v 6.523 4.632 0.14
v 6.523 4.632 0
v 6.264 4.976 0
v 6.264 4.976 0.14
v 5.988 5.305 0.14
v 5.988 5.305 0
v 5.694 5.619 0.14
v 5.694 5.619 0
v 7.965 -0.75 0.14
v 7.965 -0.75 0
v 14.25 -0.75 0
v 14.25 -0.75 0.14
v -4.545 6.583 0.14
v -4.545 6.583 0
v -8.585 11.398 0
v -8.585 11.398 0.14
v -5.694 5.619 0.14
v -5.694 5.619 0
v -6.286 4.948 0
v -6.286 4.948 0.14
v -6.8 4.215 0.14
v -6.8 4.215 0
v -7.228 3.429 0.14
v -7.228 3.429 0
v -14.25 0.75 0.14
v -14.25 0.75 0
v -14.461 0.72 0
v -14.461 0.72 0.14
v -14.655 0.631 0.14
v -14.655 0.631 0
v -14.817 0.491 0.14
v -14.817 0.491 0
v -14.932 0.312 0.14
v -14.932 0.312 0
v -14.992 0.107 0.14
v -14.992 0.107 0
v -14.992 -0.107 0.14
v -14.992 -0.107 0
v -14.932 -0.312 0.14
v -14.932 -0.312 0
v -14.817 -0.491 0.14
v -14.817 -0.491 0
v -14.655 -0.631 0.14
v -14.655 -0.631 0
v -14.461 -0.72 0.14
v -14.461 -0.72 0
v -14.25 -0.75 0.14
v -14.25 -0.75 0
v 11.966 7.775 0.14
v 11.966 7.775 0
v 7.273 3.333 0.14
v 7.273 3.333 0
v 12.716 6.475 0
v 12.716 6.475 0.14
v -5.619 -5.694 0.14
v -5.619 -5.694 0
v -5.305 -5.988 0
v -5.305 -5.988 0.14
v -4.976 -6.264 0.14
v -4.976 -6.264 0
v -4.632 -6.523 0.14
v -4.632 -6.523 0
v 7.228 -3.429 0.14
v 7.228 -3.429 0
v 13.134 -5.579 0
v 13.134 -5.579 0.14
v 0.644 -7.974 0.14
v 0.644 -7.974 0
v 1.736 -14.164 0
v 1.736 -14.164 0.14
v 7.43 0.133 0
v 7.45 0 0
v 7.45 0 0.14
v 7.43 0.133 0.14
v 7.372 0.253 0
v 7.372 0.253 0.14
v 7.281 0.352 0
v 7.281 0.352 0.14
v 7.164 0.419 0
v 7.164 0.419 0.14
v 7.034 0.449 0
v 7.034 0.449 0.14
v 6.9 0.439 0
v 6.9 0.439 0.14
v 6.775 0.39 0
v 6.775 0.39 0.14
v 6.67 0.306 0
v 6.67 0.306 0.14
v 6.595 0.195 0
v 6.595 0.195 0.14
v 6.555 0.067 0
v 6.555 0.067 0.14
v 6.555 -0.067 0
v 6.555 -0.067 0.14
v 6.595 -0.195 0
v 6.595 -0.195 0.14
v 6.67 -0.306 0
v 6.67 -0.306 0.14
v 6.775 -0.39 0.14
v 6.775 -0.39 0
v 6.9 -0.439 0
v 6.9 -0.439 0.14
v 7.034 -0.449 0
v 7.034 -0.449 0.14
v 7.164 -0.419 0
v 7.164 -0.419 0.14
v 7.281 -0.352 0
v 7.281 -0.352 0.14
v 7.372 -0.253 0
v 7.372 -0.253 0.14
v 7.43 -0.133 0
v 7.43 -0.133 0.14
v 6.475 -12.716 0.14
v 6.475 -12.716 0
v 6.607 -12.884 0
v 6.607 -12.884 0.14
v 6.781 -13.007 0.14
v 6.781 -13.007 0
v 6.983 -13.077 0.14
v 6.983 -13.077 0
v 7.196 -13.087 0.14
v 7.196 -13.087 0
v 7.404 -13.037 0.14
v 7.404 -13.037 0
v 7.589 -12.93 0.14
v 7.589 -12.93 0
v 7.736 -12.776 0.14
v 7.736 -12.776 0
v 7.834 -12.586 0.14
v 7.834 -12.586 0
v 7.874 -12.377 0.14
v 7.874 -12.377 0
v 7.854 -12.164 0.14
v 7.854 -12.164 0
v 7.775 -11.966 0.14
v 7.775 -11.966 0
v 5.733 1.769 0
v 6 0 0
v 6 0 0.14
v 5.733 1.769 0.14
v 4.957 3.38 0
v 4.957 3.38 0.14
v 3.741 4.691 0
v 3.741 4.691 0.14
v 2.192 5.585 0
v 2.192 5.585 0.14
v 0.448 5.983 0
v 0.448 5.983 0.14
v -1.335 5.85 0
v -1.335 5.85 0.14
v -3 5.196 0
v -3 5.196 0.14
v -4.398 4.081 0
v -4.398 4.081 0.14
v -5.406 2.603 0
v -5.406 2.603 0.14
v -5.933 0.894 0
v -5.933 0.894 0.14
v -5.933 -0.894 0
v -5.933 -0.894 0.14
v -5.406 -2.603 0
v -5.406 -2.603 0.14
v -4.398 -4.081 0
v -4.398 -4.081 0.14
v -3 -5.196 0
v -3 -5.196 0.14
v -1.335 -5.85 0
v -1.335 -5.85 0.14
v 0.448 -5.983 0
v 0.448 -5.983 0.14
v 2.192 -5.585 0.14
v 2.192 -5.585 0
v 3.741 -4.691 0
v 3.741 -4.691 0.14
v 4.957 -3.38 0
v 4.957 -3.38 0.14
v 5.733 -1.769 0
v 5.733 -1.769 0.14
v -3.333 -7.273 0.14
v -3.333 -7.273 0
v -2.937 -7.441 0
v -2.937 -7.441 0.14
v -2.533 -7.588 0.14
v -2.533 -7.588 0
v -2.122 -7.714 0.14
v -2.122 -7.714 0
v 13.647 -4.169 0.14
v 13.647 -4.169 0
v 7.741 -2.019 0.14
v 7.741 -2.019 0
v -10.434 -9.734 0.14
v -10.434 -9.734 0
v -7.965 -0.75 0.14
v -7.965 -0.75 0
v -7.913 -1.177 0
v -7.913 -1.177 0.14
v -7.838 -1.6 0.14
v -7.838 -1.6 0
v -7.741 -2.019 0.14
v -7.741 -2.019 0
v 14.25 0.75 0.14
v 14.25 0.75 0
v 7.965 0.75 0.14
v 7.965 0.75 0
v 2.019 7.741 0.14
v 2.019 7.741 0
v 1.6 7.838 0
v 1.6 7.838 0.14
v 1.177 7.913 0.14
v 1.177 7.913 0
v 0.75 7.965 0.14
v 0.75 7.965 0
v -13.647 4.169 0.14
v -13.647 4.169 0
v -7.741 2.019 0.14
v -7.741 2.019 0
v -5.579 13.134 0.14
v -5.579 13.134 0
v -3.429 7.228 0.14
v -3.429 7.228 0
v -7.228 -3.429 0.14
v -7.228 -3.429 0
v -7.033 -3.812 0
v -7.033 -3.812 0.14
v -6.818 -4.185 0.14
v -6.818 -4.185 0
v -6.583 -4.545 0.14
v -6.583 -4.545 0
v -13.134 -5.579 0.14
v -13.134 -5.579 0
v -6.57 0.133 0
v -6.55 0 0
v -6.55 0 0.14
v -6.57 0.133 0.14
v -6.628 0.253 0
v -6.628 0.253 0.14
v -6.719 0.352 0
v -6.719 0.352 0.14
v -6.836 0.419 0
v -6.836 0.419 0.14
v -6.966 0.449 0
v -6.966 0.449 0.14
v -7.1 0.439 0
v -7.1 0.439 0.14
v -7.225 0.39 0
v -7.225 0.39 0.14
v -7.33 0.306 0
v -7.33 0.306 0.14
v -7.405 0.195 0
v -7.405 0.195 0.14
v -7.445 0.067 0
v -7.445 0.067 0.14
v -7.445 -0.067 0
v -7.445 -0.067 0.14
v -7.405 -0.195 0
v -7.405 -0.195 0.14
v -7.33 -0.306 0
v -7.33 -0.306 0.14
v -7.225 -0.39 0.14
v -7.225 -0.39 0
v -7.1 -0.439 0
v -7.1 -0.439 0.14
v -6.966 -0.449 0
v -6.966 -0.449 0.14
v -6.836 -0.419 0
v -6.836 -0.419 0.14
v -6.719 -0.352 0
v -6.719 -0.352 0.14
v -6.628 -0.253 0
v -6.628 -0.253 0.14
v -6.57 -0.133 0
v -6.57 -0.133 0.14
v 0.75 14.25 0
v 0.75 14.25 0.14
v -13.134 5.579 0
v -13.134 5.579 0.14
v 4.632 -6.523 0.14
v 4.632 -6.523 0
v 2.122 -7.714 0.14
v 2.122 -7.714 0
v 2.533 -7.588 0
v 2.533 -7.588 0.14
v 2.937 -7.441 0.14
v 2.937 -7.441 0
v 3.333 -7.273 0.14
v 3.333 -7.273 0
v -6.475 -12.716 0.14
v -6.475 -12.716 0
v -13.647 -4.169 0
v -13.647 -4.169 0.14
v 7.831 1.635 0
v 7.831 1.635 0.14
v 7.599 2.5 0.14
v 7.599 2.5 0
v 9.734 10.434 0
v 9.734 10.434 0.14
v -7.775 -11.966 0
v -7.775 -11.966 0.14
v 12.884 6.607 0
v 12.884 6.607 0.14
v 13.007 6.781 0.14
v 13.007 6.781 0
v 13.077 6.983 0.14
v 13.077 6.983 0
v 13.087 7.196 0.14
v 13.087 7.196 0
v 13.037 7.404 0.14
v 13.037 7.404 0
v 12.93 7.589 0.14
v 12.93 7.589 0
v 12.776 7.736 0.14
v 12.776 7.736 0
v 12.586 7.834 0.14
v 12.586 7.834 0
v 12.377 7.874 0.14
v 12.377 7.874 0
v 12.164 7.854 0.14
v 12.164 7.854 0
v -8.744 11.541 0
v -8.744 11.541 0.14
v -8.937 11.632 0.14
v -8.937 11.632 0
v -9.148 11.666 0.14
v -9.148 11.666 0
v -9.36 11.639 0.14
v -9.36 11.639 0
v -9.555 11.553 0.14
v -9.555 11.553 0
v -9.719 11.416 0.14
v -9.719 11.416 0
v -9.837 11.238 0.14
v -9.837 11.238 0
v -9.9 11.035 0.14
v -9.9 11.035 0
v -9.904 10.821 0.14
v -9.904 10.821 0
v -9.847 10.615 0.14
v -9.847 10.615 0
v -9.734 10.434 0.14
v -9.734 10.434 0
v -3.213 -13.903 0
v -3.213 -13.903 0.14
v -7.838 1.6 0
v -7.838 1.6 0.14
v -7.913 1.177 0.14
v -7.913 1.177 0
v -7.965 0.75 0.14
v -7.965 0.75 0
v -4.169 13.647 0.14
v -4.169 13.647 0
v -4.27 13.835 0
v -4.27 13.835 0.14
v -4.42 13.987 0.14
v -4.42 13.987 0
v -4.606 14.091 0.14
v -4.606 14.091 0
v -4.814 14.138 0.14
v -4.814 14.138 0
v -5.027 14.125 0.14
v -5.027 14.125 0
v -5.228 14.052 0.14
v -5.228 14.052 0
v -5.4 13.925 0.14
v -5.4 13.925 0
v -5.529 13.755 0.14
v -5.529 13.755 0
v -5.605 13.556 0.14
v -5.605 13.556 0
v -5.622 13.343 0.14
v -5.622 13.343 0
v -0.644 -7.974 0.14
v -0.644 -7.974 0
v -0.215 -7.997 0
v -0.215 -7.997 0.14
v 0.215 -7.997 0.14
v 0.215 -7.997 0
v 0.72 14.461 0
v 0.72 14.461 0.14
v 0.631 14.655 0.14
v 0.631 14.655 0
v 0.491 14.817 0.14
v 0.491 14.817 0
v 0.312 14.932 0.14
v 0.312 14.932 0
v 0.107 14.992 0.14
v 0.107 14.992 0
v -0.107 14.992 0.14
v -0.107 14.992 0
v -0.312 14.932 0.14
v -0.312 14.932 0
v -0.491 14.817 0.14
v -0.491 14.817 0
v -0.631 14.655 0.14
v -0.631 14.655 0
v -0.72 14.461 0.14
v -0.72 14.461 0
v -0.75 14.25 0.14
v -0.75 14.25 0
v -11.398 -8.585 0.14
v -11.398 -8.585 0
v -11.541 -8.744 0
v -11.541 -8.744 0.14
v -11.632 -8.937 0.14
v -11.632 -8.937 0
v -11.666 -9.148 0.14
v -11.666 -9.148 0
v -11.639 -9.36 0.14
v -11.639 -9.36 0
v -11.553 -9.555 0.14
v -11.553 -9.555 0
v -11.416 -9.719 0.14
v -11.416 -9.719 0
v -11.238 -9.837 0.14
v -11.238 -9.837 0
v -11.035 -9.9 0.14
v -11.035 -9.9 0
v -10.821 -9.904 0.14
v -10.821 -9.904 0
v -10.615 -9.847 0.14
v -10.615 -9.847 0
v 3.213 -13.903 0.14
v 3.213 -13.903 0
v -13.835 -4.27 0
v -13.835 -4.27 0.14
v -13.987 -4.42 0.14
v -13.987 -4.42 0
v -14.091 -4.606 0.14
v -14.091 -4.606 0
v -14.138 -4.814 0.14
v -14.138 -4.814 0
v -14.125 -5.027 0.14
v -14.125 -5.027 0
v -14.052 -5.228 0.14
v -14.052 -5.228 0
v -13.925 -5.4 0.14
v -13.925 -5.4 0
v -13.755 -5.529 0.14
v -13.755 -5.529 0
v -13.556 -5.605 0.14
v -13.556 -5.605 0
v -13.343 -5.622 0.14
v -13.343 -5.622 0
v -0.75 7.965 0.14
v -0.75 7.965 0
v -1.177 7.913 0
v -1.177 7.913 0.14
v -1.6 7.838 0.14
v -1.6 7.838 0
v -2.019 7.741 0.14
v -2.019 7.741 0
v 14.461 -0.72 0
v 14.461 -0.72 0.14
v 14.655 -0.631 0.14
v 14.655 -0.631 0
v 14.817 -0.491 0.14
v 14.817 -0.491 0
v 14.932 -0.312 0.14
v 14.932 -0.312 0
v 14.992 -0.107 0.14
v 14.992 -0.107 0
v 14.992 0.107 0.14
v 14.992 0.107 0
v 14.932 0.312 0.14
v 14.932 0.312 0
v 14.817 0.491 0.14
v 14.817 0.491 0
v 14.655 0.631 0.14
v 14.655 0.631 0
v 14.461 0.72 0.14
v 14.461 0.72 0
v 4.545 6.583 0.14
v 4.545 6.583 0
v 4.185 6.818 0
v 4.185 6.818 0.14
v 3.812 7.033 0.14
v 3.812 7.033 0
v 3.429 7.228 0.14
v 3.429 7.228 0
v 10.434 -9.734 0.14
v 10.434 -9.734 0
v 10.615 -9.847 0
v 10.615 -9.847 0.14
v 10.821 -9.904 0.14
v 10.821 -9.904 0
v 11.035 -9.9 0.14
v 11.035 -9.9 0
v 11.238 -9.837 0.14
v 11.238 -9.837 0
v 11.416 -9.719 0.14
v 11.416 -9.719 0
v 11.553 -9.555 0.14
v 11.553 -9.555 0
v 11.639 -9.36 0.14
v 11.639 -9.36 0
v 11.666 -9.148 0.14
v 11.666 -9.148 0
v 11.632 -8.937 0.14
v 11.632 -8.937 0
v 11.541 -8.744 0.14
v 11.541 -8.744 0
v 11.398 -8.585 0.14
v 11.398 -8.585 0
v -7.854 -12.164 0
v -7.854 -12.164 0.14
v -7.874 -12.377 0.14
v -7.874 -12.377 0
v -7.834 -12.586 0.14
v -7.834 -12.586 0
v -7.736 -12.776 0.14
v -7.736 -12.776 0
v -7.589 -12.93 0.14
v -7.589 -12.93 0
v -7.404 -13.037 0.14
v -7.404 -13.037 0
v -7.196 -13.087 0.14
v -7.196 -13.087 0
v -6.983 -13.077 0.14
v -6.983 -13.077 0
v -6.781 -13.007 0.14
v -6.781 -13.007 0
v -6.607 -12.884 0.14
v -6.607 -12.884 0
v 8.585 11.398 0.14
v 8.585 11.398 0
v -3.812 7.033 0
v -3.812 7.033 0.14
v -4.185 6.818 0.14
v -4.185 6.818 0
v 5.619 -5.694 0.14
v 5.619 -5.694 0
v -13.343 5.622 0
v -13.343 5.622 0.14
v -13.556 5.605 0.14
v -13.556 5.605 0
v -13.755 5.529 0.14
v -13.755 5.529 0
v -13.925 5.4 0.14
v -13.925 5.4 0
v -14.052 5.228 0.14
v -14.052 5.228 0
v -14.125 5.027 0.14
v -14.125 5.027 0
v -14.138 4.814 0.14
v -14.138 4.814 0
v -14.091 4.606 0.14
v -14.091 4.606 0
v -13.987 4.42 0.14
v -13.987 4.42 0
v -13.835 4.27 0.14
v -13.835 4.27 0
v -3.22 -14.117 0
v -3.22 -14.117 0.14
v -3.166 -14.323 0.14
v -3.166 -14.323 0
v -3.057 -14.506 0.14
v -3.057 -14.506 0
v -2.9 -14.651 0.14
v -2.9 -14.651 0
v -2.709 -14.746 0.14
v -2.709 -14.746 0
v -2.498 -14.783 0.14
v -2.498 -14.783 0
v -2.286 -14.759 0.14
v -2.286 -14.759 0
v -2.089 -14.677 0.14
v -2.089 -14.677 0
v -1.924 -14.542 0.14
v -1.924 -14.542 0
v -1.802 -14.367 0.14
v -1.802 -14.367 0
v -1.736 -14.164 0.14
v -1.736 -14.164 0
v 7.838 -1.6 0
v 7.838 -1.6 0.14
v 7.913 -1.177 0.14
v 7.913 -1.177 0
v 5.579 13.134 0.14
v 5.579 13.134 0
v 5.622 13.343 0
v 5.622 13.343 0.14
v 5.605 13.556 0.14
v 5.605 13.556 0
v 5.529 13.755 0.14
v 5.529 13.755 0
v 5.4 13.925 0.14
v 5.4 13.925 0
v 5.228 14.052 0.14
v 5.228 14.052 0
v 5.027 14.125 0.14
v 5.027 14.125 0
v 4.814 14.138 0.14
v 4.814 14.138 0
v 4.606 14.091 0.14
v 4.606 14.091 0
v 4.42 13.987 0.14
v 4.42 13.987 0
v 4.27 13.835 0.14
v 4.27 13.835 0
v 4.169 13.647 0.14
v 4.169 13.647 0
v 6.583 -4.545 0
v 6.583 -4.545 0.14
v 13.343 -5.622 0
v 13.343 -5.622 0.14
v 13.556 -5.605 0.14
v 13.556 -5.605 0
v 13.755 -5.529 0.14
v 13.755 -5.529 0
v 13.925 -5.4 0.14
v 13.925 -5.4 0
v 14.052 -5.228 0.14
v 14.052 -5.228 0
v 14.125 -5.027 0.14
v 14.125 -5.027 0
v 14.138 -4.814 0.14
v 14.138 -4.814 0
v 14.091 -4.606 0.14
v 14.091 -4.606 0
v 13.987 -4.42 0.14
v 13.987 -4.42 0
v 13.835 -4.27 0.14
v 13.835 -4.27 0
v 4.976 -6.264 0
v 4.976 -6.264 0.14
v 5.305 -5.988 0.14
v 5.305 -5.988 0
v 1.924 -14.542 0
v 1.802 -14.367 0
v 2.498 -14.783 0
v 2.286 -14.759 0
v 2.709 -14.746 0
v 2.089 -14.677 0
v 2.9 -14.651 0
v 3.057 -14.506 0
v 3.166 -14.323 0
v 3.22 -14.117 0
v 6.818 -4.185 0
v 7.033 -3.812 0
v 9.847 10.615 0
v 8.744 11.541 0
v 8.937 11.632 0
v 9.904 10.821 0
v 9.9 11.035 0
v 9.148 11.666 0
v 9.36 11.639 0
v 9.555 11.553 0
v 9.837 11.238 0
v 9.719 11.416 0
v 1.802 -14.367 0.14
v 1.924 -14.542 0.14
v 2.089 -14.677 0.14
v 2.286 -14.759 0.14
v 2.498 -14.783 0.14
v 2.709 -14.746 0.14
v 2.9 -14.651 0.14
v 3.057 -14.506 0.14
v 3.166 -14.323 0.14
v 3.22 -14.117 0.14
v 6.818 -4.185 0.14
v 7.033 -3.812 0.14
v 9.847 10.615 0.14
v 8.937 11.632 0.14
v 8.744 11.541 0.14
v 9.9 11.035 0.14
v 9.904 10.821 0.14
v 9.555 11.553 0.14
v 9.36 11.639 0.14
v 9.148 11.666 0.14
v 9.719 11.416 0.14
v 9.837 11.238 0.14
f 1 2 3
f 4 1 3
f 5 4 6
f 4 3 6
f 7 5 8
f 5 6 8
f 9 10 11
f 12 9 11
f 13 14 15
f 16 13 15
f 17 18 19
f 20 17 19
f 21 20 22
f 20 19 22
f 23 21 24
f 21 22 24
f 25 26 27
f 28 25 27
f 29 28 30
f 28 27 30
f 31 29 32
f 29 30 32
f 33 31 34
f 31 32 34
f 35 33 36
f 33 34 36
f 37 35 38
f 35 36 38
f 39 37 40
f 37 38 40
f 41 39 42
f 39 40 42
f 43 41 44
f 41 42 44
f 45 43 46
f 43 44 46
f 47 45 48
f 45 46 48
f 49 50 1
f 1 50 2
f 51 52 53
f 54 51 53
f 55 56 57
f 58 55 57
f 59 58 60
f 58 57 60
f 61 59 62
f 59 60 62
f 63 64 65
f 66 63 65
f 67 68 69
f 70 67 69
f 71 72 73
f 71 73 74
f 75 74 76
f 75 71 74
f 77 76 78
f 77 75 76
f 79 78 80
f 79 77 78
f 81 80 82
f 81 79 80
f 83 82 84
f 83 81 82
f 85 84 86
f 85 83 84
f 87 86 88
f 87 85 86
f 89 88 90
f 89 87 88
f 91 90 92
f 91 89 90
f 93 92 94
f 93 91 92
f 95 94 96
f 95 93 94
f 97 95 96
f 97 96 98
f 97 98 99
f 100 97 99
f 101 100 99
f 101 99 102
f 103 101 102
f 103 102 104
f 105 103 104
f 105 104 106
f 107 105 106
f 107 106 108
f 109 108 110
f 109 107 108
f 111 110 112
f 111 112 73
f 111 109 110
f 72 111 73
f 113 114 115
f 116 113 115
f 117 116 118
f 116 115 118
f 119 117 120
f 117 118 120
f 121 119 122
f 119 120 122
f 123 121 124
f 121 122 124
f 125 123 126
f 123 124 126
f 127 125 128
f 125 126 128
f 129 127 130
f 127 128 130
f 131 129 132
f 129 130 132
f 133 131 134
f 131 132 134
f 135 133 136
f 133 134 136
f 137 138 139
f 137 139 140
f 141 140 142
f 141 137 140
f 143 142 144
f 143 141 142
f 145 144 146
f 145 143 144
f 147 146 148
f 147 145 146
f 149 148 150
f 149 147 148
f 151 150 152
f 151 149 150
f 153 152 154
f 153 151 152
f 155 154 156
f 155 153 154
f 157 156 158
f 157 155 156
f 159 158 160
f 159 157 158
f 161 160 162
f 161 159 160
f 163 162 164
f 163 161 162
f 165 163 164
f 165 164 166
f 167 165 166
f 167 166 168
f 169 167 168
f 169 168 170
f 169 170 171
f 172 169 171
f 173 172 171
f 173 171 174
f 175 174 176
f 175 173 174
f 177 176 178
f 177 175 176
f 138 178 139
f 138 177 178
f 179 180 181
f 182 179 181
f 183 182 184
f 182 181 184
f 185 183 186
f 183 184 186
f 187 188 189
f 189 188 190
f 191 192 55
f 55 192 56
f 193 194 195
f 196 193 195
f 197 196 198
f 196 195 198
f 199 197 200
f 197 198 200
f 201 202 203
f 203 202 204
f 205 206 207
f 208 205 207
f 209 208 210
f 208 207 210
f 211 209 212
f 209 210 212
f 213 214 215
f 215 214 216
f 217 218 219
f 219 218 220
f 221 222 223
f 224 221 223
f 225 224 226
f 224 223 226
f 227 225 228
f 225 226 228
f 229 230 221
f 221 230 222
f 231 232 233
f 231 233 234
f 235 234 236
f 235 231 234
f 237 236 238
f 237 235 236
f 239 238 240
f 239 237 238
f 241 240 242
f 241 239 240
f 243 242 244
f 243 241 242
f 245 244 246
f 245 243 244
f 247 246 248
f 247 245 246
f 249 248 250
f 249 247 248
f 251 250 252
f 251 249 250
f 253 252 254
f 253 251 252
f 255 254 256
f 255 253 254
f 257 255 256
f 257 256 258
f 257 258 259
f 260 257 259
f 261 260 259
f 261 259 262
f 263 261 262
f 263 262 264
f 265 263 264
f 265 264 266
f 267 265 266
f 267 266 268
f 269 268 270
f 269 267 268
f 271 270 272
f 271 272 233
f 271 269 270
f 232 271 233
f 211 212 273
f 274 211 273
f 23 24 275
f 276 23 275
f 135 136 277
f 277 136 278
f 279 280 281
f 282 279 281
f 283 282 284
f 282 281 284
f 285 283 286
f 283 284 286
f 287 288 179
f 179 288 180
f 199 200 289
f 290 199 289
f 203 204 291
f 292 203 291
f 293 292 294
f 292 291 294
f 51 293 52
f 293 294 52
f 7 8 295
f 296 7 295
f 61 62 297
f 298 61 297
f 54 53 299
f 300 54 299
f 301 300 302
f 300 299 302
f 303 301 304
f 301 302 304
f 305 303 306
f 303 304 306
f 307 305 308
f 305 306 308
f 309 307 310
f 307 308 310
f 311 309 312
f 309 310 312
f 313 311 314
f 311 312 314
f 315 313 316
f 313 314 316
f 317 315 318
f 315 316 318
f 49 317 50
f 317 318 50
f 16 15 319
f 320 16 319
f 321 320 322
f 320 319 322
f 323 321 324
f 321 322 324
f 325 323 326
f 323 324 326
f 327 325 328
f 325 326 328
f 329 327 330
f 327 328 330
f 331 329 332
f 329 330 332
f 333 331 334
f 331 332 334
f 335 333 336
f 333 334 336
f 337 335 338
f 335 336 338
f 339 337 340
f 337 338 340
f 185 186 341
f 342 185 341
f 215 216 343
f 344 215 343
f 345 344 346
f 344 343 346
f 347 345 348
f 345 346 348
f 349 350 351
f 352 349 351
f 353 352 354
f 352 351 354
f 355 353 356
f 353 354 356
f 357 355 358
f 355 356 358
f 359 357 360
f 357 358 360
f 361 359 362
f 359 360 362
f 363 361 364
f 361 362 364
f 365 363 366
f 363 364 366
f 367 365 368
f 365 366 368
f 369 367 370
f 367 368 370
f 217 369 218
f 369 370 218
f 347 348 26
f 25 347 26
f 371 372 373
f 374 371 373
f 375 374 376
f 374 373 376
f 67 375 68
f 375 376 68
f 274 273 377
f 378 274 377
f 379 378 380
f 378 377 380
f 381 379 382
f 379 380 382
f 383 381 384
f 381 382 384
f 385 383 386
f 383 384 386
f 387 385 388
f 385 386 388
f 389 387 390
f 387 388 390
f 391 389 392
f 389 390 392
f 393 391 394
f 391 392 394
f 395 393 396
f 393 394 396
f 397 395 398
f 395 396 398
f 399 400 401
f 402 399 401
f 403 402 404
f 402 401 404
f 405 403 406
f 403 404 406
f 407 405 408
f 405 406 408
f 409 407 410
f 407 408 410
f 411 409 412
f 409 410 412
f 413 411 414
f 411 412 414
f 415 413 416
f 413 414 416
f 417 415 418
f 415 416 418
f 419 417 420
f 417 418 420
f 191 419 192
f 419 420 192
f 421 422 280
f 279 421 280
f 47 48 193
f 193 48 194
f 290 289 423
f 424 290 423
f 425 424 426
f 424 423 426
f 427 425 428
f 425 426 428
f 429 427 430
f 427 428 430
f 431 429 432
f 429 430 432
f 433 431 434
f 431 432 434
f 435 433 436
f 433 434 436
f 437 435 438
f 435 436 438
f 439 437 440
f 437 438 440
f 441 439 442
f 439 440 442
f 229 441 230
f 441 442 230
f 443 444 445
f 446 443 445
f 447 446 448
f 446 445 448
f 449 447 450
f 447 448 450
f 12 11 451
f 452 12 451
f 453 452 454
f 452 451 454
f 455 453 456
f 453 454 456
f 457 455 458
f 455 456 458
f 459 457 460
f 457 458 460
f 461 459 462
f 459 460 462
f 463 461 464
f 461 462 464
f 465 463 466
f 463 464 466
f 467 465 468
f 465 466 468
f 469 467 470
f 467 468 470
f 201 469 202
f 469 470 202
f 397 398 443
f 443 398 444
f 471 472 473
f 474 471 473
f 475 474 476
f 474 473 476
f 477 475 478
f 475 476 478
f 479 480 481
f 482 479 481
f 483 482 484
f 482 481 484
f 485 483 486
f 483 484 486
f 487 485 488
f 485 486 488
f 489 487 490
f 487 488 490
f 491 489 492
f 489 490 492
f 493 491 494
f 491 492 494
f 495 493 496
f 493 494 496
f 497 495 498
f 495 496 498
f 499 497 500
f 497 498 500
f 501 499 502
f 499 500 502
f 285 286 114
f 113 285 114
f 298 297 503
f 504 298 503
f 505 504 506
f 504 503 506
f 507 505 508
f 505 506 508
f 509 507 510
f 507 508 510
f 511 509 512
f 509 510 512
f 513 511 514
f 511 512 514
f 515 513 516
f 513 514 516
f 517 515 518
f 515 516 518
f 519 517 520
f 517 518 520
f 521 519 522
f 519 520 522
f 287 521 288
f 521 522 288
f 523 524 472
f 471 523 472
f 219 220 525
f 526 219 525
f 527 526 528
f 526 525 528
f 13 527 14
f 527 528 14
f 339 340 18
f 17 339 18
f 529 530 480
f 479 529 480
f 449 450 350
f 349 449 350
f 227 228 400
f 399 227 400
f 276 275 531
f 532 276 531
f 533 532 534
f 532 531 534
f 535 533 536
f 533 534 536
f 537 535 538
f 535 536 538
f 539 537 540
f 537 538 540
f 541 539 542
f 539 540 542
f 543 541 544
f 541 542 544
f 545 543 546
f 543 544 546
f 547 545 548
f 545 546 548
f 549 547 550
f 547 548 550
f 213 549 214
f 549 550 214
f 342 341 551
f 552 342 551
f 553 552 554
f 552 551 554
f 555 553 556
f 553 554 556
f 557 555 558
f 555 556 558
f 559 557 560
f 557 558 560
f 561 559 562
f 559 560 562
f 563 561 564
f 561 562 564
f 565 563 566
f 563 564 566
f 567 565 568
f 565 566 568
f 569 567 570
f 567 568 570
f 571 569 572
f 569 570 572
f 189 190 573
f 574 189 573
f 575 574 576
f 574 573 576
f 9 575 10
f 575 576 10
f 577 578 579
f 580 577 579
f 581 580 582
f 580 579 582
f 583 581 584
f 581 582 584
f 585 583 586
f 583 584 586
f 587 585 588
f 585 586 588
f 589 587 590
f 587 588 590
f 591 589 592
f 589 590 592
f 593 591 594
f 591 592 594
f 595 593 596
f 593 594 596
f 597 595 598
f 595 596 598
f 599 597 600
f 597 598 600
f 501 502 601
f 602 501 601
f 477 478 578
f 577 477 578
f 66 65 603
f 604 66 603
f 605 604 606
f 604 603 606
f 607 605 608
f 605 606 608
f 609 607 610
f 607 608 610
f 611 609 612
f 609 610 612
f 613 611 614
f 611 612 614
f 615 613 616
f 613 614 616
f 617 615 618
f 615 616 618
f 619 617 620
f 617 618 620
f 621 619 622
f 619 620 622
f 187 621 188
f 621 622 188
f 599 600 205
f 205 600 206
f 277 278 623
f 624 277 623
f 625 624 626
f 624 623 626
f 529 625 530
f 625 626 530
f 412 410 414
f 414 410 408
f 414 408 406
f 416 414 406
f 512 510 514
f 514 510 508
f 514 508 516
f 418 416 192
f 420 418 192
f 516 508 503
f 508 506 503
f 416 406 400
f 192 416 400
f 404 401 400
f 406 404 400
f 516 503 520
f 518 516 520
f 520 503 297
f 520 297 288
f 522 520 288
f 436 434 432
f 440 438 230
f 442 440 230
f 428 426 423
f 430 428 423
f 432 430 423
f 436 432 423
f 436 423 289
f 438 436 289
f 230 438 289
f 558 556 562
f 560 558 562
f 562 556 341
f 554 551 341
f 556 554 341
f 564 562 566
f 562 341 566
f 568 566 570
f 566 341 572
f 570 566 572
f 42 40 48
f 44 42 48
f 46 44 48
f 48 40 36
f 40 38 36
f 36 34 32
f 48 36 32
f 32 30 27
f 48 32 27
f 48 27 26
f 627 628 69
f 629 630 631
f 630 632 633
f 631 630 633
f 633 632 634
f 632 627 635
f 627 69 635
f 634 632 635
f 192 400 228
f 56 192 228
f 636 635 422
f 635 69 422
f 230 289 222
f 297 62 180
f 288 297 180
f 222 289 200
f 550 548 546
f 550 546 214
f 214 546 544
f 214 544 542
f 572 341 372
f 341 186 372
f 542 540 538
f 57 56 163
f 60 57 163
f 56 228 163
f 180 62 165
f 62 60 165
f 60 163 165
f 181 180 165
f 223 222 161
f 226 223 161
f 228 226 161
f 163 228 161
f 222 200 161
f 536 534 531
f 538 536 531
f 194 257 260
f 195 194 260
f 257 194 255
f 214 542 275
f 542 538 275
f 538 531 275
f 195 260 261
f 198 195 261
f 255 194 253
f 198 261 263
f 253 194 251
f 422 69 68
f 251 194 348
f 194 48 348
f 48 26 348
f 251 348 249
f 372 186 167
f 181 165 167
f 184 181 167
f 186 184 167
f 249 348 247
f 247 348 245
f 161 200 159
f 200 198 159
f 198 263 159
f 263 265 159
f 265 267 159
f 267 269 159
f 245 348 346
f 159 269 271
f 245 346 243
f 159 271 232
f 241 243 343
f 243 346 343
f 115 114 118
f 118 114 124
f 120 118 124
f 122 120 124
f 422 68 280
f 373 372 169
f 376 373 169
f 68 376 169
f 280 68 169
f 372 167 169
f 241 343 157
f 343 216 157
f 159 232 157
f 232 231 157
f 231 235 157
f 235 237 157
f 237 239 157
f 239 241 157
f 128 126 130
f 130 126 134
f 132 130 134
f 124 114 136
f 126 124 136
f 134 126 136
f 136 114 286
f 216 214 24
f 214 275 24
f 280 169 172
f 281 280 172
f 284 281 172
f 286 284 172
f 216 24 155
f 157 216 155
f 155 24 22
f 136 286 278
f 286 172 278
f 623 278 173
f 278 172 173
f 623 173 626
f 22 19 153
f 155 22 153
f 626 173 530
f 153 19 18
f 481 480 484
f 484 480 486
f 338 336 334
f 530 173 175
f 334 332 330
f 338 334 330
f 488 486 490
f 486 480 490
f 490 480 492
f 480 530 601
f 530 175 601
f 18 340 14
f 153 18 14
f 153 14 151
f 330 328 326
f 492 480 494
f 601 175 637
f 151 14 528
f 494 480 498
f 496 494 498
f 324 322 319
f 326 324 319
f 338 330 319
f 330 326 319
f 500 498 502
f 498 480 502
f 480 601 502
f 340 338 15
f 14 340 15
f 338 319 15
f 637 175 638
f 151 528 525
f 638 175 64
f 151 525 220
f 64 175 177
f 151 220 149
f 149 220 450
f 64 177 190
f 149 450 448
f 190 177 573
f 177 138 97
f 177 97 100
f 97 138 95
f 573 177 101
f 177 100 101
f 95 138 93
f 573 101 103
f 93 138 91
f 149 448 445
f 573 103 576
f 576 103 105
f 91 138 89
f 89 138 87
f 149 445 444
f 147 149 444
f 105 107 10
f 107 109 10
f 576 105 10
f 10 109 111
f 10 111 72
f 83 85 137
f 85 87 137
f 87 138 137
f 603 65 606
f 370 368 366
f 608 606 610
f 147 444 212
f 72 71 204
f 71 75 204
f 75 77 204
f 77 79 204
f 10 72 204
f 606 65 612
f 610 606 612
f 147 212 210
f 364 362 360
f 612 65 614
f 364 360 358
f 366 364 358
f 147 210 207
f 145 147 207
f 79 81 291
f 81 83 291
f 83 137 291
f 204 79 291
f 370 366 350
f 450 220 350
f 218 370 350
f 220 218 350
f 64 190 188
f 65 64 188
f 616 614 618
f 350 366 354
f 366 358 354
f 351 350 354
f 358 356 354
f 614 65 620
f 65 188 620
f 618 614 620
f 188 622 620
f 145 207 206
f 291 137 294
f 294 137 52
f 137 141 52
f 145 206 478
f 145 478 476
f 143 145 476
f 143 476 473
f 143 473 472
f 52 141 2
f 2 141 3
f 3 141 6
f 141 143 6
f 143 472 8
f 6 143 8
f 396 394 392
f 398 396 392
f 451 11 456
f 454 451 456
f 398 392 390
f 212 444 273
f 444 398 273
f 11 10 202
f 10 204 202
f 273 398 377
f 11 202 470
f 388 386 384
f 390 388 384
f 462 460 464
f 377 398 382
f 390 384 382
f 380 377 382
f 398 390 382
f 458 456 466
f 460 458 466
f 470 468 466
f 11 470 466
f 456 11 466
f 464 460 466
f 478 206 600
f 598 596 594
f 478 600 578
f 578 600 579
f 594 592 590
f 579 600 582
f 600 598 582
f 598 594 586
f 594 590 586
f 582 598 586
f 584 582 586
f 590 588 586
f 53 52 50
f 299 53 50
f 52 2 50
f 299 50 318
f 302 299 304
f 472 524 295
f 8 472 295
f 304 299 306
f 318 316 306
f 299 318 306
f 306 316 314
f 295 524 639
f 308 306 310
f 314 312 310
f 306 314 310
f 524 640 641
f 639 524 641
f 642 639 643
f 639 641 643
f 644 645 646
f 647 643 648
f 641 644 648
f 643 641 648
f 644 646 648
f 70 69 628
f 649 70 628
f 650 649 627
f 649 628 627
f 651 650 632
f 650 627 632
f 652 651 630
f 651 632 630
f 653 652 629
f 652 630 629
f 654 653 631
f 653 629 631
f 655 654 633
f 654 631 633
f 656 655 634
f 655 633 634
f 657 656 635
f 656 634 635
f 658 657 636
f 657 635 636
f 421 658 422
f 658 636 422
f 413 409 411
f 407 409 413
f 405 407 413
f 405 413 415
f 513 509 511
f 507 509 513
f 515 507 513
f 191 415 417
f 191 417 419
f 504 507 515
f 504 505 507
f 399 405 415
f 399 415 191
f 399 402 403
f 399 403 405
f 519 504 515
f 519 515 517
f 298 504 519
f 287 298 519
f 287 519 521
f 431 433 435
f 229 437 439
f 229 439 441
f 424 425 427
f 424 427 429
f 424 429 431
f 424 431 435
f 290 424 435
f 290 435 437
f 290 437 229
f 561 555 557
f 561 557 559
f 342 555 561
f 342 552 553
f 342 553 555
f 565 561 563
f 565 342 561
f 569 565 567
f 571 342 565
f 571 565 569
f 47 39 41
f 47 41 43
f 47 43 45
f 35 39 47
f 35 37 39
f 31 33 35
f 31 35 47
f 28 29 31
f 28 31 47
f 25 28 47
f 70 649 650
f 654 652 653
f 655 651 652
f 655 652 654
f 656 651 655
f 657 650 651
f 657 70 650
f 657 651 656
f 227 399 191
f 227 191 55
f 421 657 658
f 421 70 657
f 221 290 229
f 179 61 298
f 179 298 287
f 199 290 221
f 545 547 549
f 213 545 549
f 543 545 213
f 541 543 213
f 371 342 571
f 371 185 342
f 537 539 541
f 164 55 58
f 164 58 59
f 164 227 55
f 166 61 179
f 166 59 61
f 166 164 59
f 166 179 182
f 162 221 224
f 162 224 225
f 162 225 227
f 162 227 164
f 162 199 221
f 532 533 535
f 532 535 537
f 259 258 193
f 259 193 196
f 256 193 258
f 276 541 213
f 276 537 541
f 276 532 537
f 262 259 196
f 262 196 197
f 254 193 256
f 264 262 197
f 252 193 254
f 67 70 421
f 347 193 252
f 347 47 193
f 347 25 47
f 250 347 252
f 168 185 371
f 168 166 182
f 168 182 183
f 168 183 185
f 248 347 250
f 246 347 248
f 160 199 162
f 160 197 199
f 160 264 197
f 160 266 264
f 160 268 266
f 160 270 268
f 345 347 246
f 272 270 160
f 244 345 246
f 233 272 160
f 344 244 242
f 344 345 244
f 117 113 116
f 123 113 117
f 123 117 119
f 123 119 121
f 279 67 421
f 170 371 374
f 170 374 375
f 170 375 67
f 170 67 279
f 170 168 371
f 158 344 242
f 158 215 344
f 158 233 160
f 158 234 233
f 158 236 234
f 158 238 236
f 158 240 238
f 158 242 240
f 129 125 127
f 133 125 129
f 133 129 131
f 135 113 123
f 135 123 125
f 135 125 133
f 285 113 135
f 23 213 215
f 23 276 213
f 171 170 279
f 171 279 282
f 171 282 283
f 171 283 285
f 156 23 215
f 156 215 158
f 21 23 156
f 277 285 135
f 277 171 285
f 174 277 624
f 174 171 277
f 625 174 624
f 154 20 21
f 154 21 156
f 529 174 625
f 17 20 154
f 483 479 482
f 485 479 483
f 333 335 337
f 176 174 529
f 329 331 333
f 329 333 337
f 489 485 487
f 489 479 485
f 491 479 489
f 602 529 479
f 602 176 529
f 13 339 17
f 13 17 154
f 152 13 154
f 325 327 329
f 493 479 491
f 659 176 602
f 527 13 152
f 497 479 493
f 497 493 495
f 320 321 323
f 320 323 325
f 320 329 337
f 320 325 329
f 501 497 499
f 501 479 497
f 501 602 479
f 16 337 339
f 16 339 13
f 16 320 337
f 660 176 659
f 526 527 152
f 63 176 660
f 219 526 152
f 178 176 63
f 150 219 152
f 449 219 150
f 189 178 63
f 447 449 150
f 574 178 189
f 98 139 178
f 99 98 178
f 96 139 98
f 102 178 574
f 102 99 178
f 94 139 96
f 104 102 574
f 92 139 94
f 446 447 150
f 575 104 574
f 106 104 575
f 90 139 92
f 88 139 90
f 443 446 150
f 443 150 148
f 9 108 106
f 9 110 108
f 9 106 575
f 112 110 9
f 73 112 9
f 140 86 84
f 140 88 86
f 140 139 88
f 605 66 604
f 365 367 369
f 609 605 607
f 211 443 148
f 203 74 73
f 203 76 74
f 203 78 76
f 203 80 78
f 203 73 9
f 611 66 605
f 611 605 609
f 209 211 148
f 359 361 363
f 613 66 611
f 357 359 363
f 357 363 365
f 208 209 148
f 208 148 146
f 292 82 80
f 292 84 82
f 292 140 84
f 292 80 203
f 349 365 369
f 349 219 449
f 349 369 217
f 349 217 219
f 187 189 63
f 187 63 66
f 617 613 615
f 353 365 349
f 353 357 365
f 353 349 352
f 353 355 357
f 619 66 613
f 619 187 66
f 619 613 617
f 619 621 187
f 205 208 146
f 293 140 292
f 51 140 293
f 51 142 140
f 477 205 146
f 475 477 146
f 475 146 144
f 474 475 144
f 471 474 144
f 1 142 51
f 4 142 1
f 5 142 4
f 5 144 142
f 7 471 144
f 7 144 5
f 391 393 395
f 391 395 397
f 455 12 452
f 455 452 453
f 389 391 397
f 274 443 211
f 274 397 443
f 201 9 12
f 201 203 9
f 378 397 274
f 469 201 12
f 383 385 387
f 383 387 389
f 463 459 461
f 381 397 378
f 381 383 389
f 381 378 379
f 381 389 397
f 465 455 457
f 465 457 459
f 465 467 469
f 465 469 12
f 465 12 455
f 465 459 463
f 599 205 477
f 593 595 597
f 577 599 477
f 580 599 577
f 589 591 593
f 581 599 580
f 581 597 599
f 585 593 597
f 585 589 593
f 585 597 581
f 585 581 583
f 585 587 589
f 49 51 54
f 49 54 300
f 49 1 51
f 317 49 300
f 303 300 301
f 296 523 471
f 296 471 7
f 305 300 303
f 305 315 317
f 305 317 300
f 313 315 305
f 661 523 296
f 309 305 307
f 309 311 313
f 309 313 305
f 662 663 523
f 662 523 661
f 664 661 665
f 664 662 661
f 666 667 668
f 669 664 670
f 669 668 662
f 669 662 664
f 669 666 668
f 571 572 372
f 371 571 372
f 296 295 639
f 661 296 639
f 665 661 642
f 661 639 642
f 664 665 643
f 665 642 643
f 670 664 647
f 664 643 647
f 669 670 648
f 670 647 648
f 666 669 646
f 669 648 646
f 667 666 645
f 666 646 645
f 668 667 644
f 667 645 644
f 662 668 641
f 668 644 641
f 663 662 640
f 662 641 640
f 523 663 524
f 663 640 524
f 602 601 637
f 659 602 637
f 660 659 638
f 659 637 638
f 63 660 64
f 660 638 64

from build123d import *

# Parameters (mm, degrees)
F0_R     = 0.45
F0_R_2   = 6
F1_DEPTH = 0.14


with BuildPart() as f1:
    # F0 (on Top) → F1 (new body)
    with BuildSketch(Plane.XY):
        with BuildLine():
            ThreePointArc((7.964766, -0.75), (7.991187, -0.375414), (8, 0))
            ThreePointArc((8, 0), (7.991187, 0.375414), (7.964766, 0.75))
            ThreePointArc((7.964766, 0.75), (7.727407, 2.070552), (7.27269, 3.332864))
            ThreePointArc((7.27269, 3.332864), (6.928203, 4), (6.52269, 4.631902))
            ThreePointArc((6.52269, 4.631902), (6.128356, 5.142301), (5.694186, 5.619274))
            ThreePointArc((5.694186, 5.619274), (5.142301, 6.128356), (4.54512, 6.583456))
            ThreePointArc((4.54512, 6.583456), (4, 6.928203), (3.42888, 7.227917))
            ThreePointArc((3.42888, 7.227917), (2.736161, 7.517541), (2.019341, 7.740947))
            ThreePointArc((2.019341, 7.740947), (1.389185, 7.878462), (0.75, 7.964766))
            ThreePointArc((0.75, 7.964766), (0, 8), (-0.75, 7.964766))
            ThreePointArc((-0.75, 7.964766), (-1.389185, 7.878462), (-2.019341, 7.740947))
            ThreePointArc((-2.019341, 7.740947), (-2.736161, 7.517541), (-3.42888, 7.227917))
            ThreePointArc((-3.42888, 7.227917), (-4, 6.928203), (-4.54512, 6.583456))
            ThreePointArc((-4.54512, 6.583456), (-5.142301, 6.128356), (-5.694186, 5.619274))
            ThreePointArc((-5.694186, 5.619274), (-6.553216, 4.588611), (-7.227917, 3.42888))
            ThreePointArc((-7.227917, 3.42888), (-7.517541, 2.736161), (-7.740947, 2.019341))
            ThreePointArc((-7.740947, 2.019341), (-7.878462, 1.389185), (-7.964766, 0.75))
            ThreePointArc((-7.964766, 0.75), (-8, 0), (-7.964766, -0.75))
            ThreePointArc((-7.964766, -0.75), (-7.878462, -1.389185), (-7.740947, -2.019341))
            ThreePointArc((-7.740947, -2.019341), (-7.517541, -2.736161), (-7.227917, -3.42888))
            ThreePointArc((-7.227917, -3.42888), (-6.928203, -4), (-6.583456, -4.54512))
            ThreePointArc((-6.583456, -4.54512), (-6.128356, -5.142301), (-5.619274, -5.694186))
            ThreePointArc((-5.619274, -5.694186), (-5.142301, -6.128356), (-4.631902, -6.52269))
            ThreePointArc((-4.631902, -6.52269), (-4, -6.928203), (-3.332864, -7.27269))
            ThreePointArc((-3.332864, -7.27269), (-2.736161, -7.517541), (-2.121673, -7.713527))
            ThreePointArc((-2.121673, -7.713527), (-1.389185, -7.878462), (-0.644461, -7.974))
            ThreePointArc((-0.644461, -7.974), (0, -8), (0.644461, -7.974))
            ThreePointArc((0.644461, -7.974), (1.389185, -7.878462), (2.121673, -7.713527))
            ThreePointArc((2.121673, -7.713527), (2.736161, -7.517541), (3.332864, -7.27269))
            ThreePointArc((3.332864, -7.27269), (4, -6.928203), (4.631902, -6.52269))
            ThreePointArc((4.631902, -6.52269), (5.142301, -6.128356), (5.619274, -5.694186))
            ThreePointArc((5.619274, -5.694186), (6.128356, -5.142301), (6.583456, -4.54512))
            ThreePointArc((6.583456, -4.54512), (6.928203, -4), (7.227917, -3.42888))
            ThreePointArc((7.227917, -3.42888), (7.517541, -2.736161), (7.740947, -2.019341))
            ThreePointArc((7.740947, -2.019341), (7.878462, -1.389185), (7.964766, -0.75))
        make_face()
        with Locations((-7, 0)):
            Circle(F0_R, mode=Mode.SUBTRACT)
        Circle(F0_R_2, mode=Mode.SUBTRACT)
        with Locations((7, 0)):
            Circle(F0_R, mode=Mode.SUBTRACT)
        with BuildLine():
            ThreePointArc((7.964766, 0.75), (7.991187, 0.375414), (8, 0))
            ThreePointArc((8, 0), (7.991187, -0.375414), (7.964766, -0.75))
            Line((7.964766, -0.75), (14.25, -0.75))
            ThreePointArc((14.25, -0.75), (15, 0), (14.25, 0.75))
            Line((14.25, 0.75), (7.964766, 0.75))
        make_face()
        with BuildLine():
            ThreePointArc((6.52269, 4.631902), (6.928203, 4), (7.27269, 3.332864))
            Line((7.27269, 3.332864), (12.715862, 6.475481))
            ThreePointArc((12.715862, 6.475481), (12.990381, 7.5), (11.965862, 7.774519))
            Line((11.965862, 7.774519), (6.52269, 4.631902))
        make_face()
        with BuildLine():
            Line((13.647135, -4.169018), (7.740947, -2.019341))
            ThreePointArc((7.740947, -2.019341), (7.517541, -2.736161), (7.227917, -3.42888))
            Line((7.227917, -3.42888), (13.134105, -5.578557))
            ThreePointArc((13.134105, -5.578557), (14.095389, -5.130302), (13.647135, -4.169018))
        make_face()
        with BuildLine():
            ThreePointArc((4.54512, 6.583456), (5.142301, 6.128356), (5.694186, 5.619274))
            Line((5.694186, 5.619274), (9.734257, 10.434043))
            ThreePointArc((9.734257, 10.434043), (9.641814, 11.490667), (8.58519, 11.398224))
            Line((8.58519, 11.398224), (4.54512, 6.583456))
        make_face()
        with BuildLine():
            Line((11.398224, -8.58519), (6.583456, -4.54512))
            ThreePointArc((6.583456, -4.54512), (6.128356, -5.142301), (5.619274, -5.694186))
            Line((5.619274, -5.694186), (10.434043, -9.734257))
            ThreePointArc((10.434043, -9.734257), (11.490667, -9.641814), (11.398224, -8.58519))
        make_face()
        with BuildLine():
            ThreePointArc((2.019341, 7.740947), (2.736161, 7.517541), (3.42888, 7.227917))
            Line((3.42888, 7.227917), (5.578557, 13.134105))
            ThreePointArc((5.578557, 13.134105), (5.130302, 14.095389), (4.169018, 13.647135))
            Line((4.169018, 13.647135), (2.019341, 7.740947))
        make_face()
        with BuildLine():
            Line((7.774519, -11.965862), (4.631902, -6.52269))
            ThreePointArc((4.631902, -6.52269), (4, -6.928203), (3.332864, -7.27269))
            Line((3.332864, -7.27269), (6.475481, -12.715862))
            ThreePointArc((6.475481, -12.715862), (7.5, -12.990381), (7.774519, -11.965862))
        make_face()
        with BuildLine():
            ThreePointArc((-0.75, 7.964766), (0, 8), (0.75, 7.964766))
            Line((0.75, 7.964766), (0.75, 14.25))
            ThreePointArc((0.75, 14.25), (0, 15), (-0.75, 14.25))
            Line((-0.75, 14.25), (-0.75, 7.964766))
        make_face()
        with BuildLine():
            Line((3.213092, -13.903274), (2.121673, -7.713527))
            ThreePointArc((2.121673, -7.713527), (1.389185, -7.878462), (0.644461, -7.974))
            Line((0.644461, -7.974), (1.735881, -14.163747))
            ThreePointArc((1.735881, -14.163747), (2.604723, -14.772116), (3.213092, -13.903274))
        make_face()
        with BuildLine():
            ThreePointArc((-3.42888, 7.227917), (-2.736161, 7.517541), (-2.019341, 7.740947))
            Line((-2.019341, 7.740947), (-4.169018, 13.647135))
            ThreePointArc((-4.169018, 13.647135), (-5.130302, 14.095389), (-5.578557, 13.134105))
            Line((-5.578557, 13.134105), (-3.42888, 7.227917))
        make_face()
        with BuildLine():
            Line((-1.735881, -14.163747), (-0.644461, -7.974))
            ThreePointArc((-0.644461, -7.974), (-1.389185, -7.878462), (-2.121673, -7.713527))
            Line((-2.121673, -7.713527), (-3.213092, -13.903274))
            ThreePointArc((-3.213092, -13.903274), (-2.604723, -14.772116), (-1.735881, -14.163747))
        make_face()
        with BuildLine():
            ThreePointArc((-5.694186, 5.619274), (-5.142301, 6.128356), (-4.54512, 6.583456))
            Line((-4.54512, 6.583456), (-8.58519, 11.398224))
            ThreePointArc((-8.58519, 11.398224), (-9.641814, 11.490667), (-9.734257, 10.434043))
            Line((-9.734257, 10.434043), (-5.694186, 5.619274))
        make_face()
        with BuildLine():
            Line((-6.475481, -12.715862), (-3.332864, -7.27269))
            ThreePointArc((-3.332864, -7.27269), (-4, -6.928203), (-4.631902, -6.52269))
            Line((-4.631902, -6.52269), (-7.774519, -11.965862))
            ThreePointArc((-7.774519, -11.965862), (-7.5, -12.990381), (-6.475481, -12.715862))
        make_face()
        with BuildLine():
            ThreePointArc((-7.740947, 2.019341), (-7.517541, 2.736161), (-7.227917, 3.42888))
            Line((-7.227917, 3.42888), (-13.134105, 5.578557))
            ThreePointArc((-13.134105, 5.578557), (-14.095389, 5.130302), (-13.647135, 4.169018))
            Line((-13.647135, 4.169018), (-7.740947, 2.019341))
        make_face()
        with BuildLine():
            Line((-10.434043, -9.734257), (-5.619274, -5.694186))
            ThreePointArc((-5.619274, -5.694186), (-6.128356, -5.142301), (-6.583456, -4.54512))
            Line((-6.583456, -4.54512), (-11.398224, -8.58519))
            ThreePointArc((-11.398224, -8.58519), (-11.490667, -9.641814), (-10.434043, -9.734257))
        make_face()
        with BuildLine():
            ThreePointArc((-7.964766, -0.75), (-8, 0), (-7.964766, 0.75))
            Line((-7.964766, 0.75), (-14.25, 0.75))
            ThreePointArc((-14.25, 0.75), (-15, 0), (-14.25, -0.75))
            Line((-14.25, -0.75), (-7.964766, -0.75))
        make_face()
        with BuildLine():
            Line((-13.134105, -5.578557), (-7.227917, -3.42888))
            ThreePointArc((-7.227917, -3.42888), (-7.517541, -2.736161), (-7.740947, -2.019341))
            Line((-7.740947, -2.019341), (-13.647135, -4.169018))
            ThreePointArc((-13.647135, -4.169018), (-14.095389, -5.130302), (-13.134105, -5.578557))
        make_face()
    extrude(amount=F1_DEPTH)


solid = f1.part
